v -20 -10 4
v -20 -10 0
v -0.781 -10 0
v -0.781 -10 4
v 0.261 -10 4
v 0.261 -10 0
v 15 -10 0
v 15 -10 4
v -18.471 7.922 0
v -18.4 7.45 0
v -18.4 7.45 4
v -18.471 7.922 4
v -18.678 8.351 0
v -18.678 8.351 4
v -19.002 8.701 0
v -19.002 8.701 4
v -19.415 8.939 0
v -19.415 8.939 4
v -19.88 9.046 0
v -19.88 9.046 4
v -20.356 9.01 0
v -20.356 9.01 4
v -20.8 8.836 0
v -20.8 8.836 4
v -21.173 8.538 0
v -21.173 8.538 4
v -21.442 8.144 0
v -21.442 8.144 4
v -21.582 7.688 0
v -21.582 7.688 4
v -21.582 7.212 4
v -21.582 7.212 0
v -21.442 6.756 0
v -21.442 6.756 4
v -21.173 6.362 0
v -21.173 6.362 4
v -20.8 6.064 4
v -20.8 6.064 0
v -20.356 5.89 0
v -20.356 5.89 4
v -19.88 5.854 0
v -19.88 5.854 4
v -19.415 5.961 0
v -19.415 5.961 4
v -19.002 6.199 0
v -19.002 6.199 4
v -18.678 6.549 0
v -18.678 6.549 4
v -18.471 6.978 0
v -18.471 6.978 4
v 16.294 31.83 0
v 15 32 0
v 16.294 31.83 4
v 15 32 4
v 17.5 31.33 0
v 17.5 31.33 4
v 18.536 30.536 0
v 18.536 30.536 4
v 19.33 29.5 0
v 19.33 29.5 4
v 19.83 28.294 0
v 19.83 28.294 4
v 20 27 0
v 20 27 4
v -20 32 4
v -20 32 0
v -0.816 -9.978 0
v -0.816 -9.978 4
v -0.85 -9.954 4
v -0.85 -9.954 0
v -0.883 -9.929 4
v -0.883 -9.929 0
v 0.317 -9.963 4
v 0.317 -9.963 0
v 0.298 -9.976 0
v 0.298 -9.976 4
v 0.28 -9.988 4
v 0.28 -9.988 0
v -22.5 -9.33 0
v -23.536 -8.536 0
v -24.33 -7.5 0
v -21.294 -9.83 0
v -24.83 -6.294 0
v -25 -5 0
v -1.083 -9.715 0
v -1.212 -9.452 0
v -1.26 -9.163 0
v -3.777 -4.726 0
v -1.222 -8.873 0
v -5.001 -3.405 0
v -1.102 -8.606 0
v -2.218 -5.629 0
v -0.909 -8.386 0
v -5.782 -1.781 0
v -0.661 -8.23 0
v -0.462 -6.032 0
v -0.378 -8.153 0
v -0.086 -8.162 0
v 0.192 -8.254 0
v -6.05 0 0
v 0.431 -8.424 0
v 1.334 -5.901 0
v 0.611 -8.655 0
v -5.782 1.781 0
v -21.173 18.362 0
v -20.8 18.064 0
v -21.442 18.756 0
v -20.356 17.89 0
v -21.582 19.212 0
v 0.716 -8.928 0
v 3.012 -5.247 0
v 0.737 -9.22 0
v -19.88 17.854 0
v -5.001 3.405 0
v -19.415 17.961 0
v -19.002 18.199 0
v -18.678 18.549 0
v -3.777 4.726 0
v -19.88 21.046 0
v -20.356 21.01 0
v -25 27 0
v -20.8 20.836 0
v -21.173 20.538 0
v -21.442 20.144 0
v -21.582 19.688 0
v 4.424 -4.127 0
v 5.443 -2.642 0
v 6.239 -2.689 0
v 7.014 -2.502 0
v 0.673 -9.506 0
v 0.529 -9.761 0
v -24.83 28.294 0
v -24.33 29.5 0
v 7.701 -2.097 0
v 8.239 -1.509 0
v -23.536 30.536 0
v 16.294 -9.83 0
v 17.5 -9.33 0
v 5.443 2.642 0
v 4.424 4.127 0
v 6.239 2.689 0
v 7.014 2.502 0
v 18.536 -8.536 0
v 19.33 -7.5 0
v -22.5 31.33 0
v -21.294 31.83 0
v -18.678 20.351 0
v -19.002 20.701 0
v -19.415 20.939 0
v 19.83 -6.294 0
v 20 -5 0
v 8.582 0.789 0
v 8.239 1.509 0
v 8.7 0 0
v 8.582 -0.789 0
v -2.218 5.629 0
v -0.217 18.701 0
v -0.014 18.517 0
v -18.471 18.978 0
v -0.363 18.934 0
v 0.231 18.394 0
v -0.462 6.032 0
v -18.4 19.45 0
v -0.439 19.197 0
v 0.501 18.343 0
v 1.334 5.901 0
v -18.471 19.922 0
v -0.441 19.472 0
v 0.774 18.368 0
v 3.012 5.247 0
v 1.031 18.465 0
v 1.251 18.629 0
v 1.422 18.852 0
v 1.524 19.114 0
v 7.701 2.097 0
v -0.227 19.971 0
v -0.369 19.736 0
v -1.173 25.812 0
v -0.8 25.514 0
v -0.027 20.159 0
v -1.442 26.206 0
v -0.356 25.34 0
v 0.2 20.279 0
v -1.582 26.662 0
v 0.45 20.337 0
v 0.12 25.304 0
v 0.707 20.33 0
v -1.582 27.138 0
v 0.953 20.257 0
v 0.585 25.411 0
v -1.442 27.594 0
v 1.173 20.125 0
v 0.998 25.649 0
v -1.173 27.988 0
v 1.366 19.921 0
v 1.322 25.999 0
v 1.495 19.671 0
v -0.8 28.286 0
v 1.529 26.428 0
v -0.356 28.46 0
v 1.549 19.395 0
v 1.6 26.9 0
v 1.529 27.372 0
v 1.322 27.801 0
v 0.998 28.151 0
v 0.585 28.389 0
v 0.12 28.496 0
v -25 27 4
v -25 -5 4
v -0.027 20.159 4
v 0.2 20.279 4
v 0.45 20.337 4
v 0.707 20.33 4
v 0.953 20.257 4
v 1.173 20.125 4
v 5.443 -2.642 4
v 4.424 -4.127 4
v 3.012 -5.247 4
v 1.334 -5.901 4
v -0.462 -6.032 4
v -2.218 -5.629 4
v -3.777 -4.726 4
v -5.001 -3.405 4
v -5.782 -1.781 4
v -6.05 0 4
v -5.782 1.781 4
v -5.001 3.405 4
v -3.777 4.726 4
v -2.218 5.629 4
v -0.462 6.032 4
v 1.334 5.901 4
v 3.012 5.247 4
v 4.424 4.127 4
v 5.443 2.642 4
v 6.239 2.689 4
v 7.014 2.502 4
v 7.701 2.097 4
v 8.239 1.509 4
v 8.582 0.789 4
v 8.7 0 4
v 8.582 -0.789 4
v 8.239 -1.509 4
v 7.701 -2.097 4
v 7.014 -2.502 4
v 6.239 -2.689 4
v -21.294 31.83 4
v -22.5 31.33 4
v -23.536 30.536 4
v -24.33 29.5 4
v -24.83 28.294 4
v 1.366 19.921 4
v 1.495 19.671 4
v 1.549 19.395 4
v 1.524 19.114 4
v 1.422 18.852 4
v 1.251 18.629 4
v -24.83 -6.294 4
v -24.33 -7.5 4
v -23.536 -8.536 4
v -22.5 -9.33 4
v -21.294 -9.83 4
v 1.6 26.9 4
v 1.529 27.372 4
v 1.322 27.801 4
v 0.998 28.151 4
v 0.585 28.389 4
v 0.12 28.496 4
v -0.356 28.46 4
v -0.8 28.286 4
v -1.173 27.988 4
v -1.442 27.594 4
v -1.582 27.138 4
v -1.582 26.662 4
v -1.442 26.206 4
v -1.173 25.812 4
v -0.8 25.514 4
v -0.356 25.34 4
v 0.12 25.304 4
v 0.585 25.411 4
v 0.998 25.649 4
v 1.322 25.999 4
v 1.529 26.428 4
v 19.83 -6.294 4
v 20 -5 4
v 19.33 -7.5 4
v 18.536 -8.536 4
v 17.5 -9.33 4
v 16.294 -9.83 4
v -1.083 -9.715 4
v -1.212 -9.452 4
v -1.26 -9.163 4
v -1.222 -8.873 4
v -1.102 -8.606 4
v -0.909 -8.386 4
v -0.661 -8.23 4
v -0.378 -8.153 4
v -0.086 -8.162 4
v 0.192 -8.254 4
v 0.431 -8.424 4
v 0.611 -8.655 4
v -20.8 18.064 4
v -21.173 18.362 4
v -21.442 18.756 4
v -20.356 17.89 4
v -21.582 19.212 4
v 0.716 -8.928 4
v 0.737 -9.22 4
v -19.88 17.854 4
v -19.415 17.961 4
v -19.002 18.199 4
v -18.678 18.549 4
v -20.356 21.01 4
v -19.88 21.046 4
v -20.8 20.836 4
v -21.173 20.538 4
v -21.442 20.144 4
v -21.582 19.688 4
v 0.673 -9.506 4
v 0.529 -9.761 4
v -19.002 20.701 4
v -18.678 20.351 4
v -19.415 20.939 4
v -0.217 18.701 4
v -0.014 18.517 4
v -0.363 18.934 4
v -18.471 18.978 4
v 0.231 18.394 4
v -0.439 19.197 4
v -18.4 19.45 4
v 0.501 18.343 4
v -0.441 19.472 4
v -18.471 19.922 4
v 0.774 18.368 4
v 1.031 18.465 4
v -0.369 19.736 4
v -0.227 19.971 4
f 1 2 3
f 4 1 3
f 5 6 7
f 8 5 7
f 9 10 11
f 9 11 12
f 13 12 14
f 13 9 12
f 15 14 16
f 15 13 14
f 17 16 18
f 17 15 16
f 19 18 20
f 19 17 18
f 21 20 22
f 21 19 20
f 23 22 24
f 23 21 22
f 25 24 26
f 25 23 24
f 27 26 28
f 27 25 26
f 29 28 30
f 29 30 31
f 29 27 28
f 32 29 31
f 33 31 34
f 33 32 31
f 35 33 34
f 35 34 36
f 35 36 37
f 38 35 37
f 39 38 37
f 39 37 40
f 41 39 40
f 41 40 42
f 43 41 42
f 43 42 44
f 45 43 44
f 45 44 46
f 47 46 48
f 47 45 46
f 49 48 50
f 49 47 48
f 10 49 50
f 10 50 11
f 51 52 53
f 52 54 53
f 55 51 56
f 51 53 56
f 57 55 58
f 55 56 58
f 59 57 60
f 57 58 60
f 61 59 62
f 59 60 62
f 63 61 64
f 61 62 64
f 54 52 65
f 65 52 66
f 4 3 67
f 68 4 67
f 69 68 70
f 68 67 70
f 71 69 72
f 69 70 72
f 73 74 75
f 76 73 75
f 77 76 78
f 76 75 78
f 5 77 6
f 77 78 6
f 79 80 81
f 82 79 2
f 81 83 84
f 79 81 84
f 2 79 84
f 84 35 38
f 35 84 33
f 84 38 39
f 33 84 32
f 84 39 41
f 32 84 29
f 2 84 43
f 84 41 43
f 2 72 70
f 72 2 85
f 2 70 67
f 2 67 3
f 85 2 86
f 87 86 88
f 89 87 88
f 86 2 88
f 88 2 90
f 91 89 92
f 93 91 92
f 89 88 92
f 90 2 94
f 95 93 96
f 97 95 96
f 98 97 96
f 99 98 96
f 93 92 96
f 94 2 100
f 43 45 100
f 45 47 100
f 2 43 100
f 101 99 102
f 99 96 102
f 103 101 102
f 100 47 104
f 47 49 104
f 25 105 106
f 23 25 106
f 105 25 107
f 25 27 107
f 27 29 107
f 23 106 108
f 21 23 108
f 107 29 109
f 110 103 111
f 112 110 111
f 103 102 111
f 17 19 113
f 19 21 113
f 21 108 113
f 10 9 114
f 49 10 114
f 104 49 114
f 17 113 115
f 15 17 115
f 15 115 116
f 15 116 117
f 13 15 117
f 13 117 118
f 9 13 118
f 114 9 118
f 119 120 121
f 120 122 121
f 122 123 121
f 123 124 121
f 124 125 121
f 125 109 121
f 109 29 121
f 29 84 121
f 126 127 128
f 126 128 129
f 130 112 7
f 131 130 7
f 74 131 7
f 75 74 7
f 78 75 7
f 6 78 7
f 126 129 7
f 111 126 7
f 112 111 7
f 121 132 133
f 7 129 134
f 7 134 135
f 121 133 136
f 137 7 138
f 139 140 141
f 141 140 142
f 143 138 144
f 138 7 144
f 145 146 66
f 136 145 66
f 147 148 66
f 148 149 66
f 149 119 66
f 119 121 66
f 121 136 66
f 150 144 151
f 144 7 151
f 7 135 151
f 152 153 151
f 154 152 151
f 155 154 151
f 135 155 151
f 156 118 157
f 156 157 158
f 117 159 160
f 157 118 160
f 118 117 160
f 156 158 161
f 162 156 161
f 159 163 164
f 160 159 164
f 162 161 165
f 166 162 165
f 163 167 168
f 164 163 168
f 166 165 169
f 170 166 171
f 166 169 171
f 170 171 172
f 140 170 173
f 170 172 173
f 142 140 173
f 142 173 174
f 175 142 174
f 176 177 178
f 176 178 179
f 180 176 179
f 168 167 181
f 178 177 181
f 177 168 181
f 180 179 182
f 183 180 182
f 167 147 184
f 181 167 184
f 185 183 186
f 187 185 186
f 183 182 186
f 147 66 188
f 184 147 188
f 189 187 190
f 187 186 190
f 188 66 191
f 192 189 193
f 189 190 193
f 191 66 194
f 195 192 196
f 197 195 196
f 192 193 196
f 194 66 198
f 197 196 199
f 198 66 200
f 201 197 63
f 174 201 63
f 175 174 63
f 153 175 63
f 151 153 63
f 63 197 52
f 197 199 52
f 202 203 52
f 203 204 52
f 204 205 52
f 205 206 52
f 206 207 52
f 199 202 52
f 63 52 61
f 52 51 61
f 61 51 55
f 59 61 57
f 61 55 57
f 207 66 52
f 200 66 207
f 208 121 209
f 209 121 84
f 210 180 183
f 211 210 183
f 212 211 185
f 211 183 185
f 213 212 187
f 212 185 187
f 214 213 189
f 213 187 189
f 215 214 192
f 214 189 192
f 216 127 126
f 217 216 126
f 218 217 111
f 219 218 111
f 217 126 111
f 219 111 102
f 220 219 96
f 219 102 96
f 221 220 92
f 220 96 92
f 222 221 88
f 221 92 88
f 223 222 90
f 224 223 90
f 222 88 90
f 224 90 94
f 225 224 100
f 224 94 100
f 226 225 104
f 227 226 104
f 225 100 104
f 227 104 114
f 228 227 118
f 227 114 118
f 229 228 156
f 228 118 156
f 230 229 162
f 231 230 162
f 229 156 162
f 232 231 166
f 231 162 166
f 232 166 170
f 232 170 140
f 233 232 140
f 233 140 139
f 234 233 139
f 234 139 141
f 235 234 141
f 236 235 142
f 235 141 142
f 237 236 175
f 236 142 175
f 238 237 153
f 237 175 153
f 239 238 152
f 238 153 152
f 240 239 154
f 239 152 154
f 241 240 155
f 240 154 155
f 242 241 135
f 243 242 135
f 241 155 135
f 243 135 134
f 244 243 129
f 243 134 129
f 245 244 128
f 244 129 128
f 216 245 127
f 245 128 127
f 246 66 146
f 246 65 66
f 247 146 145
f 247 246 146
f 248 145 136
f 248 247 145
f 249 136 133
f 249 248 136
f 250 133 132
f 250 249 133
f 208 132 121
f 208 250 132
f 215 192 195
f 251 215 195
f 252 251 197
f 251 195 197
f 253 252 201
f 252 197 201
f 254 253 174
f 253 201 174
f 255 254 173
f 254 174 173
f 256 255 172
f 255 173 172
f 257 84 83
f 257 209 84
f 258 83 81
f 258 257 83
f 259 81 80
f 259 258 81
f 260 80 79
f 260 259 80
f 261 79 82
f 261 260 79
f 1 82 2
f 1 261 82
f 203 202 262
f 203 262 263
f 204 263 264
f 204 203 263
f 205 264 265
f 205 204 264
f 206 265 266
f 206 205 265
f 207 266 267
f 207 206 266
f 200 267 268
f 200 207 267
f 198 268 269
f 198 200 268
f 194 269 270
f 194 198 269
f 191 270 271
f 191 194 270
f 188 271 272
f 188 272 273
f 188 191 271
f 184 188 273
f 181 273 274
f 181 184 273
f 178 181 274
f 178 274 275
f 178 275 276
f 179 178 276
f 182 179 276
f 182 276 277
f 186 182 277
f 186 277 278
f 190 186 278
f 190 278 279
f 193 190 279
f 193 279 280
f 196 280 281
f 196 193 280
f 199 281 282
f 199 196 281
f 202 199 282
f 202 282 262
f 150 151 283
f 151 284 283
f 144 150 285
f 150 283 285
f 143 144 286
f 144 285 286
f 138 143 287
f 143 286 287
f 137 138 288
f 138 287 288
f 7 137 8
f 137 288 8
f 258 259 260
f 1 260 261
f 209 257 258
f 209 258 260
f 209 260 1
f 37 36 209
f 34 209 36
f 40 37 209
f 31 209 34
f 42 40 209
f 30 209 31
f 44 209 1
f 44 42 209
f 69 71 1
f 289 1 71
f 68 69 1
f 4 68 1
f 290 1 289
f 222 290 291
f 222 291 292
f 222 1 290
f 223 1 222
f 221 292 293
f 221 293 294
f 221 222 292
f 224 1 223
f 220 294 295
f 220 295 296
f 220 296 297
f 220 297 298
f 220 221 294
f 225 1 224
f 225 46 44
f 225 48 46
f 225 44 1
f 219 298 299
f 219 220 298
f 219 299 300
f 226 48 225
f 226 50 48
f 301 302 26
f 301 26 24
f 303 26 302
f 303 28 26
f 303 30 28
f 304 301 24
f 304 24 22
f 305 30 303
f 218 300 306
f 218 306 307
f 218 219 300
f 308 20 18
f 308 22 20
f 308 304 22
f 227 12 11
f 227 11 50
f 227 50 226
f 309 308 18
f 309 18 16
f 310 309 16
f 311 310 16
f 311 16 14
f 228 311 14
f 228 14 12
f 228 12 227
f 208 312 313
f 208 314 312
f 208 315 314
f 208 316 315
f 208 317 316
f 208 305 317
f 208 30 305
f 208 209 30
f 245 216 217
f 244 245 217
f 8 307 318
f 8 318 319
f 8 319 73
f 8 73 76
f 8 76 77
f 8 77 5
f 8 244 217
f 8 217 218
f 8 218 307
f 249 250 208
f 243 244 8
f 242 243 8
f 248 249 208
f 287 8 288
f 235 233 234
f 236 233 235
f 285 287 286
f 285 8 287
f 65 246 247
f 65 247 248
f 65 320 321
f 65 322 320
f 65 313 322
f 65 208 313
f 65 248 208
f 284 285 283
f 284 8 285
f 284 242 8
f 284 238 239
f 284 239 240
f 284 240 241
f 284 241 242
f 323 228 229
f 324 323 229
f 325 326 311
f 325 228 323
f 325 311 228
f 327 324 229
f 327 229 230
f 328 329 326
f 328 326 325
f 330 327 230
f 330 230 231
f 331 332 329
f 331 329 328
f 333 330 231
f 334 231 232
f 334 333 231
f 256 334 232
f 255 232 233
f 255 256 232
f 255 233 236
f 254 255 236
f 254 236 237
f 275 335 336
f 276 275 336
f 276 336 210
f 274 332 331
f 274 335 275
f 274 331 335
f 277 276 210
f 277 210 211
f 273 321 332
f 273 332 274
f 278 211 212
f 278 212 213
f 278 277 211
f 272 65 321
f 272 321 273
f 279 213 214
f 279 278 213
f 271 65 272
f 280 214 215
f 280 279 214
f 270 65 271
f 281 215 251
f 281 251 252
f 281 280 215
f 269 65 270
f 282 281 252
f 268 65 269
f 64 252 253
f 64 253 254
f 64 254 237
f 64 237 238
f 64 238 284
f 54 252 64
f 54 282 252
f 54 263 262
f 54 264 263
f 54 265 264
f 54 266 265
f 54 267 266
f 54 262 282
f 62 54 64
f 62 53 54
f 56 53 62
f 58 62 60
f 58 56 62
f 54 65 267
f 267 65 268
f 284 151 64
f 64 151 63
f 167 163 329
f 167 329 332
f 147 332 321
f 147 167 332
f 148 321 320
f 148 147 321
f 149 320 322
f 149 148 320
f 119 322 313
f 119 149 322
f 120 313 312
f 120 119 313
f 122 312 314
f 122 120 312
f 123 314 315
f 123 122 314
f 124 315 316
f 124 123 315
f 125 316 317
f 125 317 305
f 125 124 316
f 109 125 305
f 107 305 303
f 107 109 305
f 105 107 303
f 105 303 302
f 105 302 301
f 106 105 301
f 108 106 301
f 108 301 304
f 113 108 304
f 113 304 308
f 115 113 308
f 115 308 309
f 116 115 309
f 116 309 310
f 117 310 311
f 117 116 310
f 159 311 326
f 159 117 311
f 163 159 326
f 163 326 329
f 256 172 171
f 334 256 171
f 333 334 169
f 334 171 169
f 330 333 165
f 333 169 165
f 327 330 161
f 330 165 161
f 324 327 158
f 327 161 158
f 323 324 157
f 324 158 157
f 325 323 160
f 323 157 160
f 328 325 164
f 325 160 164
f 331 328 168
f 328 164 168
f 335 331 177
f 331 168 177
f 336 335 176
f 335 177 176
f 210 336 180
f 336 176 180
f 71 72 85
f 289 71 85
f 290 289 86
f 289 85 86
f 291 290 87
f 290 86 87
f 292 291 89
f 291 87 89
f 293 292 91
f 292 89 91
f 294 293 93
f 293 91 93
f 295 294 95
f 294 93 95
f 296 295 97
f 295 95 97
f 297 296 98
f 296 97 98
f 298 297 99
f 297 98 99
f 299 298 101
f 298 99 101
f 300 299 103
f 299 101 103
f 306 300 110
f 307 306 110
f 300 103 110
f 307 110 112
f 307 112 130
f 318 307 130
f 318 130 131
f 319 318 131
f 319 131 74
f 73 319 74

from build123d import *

# Parameters (mm, degrees)
SKETCH1_R           = 1.6
BOSS_EXTRUDE1_DEPTH = 4
FILLET1_R           = 5


with BuildPart() as part:
    # Sketch1 → Boss-Extrude1 (new body)
    with BuildSketch(Plane.XY):
        with BuildLine():
            Line((20, 32), (-25, 32))
            Line((-25, 32), (-25, -10))
            Line((-25, -10), (-0.78093138, -10))
            ThreePointArc((-0.78093138, -10), (-0.832904243, -9.966038414), (-0.882669446, -9.928917093))
            ThreePointArc((-0.882669446, -9.928917093), (-0.231731966, -8.146704874), (0.316845382, -9.963037138))
            ThreePointArc((0.316845382, -9.963037138), (0.289034097, -9.981991883), (0.260600707, -10))
            Line((0.260600707, -10), (20, -10))
            Line((20, -10), (20, 32))
        make_face()
        with Locations((-20, 7.45)):
            Circle(SKETCH1_R, mode=Mode.SUBTRACT)
        with BuildLine():
            ThreePointArc((5.442708333, -2.641860329), (-6.05, 0), (5.442708333, 2.641860329))
            ThreePointArc((5.442708333, 2.641860329), (8.7, 0), (5.442708333, -2.641860329))
        make_face(mode=Mode.SUBTRACT)
        with Locations((-20, 19.45)):
            Circle(SKETCH1_R, mode=Mode.SUBTRACT)
        with BuildLine():
            ThreePointArc((1.25114395, 18.628974283), (-0.217290022, 18.701098604), (-0.026825007, 20.158913176))
            ThreePointArc((-0.026825007, 20.158913176), (0.578619081, 20.341772292), (1.172689821, 20.124793131))
            ThreePointArc((1.172689821, 20.124793131), (1.548813096, 19.39455356), (1.25114395, 18.628974283))
        make_face(mode=Mode.SUBTRACT)
        with Locations((0, 26.9)):
            Circle(SKETCH1_R, mode=Mode.SUBTRACT)
    extrude(amount=BOSS_EXTRUDE1_DEPTH)

    # Fillet1
    fillet1_edges = [part.edges().sort_by_distance(p)[0] for p in [
        (-25, -10, 2),
        (-25, 32, 2),
        (20, 32, 2),
        (20, -10, 2),
    ]]
    fillet(fillet1_edges, radius=FILLET1_R)


solid = part.part
